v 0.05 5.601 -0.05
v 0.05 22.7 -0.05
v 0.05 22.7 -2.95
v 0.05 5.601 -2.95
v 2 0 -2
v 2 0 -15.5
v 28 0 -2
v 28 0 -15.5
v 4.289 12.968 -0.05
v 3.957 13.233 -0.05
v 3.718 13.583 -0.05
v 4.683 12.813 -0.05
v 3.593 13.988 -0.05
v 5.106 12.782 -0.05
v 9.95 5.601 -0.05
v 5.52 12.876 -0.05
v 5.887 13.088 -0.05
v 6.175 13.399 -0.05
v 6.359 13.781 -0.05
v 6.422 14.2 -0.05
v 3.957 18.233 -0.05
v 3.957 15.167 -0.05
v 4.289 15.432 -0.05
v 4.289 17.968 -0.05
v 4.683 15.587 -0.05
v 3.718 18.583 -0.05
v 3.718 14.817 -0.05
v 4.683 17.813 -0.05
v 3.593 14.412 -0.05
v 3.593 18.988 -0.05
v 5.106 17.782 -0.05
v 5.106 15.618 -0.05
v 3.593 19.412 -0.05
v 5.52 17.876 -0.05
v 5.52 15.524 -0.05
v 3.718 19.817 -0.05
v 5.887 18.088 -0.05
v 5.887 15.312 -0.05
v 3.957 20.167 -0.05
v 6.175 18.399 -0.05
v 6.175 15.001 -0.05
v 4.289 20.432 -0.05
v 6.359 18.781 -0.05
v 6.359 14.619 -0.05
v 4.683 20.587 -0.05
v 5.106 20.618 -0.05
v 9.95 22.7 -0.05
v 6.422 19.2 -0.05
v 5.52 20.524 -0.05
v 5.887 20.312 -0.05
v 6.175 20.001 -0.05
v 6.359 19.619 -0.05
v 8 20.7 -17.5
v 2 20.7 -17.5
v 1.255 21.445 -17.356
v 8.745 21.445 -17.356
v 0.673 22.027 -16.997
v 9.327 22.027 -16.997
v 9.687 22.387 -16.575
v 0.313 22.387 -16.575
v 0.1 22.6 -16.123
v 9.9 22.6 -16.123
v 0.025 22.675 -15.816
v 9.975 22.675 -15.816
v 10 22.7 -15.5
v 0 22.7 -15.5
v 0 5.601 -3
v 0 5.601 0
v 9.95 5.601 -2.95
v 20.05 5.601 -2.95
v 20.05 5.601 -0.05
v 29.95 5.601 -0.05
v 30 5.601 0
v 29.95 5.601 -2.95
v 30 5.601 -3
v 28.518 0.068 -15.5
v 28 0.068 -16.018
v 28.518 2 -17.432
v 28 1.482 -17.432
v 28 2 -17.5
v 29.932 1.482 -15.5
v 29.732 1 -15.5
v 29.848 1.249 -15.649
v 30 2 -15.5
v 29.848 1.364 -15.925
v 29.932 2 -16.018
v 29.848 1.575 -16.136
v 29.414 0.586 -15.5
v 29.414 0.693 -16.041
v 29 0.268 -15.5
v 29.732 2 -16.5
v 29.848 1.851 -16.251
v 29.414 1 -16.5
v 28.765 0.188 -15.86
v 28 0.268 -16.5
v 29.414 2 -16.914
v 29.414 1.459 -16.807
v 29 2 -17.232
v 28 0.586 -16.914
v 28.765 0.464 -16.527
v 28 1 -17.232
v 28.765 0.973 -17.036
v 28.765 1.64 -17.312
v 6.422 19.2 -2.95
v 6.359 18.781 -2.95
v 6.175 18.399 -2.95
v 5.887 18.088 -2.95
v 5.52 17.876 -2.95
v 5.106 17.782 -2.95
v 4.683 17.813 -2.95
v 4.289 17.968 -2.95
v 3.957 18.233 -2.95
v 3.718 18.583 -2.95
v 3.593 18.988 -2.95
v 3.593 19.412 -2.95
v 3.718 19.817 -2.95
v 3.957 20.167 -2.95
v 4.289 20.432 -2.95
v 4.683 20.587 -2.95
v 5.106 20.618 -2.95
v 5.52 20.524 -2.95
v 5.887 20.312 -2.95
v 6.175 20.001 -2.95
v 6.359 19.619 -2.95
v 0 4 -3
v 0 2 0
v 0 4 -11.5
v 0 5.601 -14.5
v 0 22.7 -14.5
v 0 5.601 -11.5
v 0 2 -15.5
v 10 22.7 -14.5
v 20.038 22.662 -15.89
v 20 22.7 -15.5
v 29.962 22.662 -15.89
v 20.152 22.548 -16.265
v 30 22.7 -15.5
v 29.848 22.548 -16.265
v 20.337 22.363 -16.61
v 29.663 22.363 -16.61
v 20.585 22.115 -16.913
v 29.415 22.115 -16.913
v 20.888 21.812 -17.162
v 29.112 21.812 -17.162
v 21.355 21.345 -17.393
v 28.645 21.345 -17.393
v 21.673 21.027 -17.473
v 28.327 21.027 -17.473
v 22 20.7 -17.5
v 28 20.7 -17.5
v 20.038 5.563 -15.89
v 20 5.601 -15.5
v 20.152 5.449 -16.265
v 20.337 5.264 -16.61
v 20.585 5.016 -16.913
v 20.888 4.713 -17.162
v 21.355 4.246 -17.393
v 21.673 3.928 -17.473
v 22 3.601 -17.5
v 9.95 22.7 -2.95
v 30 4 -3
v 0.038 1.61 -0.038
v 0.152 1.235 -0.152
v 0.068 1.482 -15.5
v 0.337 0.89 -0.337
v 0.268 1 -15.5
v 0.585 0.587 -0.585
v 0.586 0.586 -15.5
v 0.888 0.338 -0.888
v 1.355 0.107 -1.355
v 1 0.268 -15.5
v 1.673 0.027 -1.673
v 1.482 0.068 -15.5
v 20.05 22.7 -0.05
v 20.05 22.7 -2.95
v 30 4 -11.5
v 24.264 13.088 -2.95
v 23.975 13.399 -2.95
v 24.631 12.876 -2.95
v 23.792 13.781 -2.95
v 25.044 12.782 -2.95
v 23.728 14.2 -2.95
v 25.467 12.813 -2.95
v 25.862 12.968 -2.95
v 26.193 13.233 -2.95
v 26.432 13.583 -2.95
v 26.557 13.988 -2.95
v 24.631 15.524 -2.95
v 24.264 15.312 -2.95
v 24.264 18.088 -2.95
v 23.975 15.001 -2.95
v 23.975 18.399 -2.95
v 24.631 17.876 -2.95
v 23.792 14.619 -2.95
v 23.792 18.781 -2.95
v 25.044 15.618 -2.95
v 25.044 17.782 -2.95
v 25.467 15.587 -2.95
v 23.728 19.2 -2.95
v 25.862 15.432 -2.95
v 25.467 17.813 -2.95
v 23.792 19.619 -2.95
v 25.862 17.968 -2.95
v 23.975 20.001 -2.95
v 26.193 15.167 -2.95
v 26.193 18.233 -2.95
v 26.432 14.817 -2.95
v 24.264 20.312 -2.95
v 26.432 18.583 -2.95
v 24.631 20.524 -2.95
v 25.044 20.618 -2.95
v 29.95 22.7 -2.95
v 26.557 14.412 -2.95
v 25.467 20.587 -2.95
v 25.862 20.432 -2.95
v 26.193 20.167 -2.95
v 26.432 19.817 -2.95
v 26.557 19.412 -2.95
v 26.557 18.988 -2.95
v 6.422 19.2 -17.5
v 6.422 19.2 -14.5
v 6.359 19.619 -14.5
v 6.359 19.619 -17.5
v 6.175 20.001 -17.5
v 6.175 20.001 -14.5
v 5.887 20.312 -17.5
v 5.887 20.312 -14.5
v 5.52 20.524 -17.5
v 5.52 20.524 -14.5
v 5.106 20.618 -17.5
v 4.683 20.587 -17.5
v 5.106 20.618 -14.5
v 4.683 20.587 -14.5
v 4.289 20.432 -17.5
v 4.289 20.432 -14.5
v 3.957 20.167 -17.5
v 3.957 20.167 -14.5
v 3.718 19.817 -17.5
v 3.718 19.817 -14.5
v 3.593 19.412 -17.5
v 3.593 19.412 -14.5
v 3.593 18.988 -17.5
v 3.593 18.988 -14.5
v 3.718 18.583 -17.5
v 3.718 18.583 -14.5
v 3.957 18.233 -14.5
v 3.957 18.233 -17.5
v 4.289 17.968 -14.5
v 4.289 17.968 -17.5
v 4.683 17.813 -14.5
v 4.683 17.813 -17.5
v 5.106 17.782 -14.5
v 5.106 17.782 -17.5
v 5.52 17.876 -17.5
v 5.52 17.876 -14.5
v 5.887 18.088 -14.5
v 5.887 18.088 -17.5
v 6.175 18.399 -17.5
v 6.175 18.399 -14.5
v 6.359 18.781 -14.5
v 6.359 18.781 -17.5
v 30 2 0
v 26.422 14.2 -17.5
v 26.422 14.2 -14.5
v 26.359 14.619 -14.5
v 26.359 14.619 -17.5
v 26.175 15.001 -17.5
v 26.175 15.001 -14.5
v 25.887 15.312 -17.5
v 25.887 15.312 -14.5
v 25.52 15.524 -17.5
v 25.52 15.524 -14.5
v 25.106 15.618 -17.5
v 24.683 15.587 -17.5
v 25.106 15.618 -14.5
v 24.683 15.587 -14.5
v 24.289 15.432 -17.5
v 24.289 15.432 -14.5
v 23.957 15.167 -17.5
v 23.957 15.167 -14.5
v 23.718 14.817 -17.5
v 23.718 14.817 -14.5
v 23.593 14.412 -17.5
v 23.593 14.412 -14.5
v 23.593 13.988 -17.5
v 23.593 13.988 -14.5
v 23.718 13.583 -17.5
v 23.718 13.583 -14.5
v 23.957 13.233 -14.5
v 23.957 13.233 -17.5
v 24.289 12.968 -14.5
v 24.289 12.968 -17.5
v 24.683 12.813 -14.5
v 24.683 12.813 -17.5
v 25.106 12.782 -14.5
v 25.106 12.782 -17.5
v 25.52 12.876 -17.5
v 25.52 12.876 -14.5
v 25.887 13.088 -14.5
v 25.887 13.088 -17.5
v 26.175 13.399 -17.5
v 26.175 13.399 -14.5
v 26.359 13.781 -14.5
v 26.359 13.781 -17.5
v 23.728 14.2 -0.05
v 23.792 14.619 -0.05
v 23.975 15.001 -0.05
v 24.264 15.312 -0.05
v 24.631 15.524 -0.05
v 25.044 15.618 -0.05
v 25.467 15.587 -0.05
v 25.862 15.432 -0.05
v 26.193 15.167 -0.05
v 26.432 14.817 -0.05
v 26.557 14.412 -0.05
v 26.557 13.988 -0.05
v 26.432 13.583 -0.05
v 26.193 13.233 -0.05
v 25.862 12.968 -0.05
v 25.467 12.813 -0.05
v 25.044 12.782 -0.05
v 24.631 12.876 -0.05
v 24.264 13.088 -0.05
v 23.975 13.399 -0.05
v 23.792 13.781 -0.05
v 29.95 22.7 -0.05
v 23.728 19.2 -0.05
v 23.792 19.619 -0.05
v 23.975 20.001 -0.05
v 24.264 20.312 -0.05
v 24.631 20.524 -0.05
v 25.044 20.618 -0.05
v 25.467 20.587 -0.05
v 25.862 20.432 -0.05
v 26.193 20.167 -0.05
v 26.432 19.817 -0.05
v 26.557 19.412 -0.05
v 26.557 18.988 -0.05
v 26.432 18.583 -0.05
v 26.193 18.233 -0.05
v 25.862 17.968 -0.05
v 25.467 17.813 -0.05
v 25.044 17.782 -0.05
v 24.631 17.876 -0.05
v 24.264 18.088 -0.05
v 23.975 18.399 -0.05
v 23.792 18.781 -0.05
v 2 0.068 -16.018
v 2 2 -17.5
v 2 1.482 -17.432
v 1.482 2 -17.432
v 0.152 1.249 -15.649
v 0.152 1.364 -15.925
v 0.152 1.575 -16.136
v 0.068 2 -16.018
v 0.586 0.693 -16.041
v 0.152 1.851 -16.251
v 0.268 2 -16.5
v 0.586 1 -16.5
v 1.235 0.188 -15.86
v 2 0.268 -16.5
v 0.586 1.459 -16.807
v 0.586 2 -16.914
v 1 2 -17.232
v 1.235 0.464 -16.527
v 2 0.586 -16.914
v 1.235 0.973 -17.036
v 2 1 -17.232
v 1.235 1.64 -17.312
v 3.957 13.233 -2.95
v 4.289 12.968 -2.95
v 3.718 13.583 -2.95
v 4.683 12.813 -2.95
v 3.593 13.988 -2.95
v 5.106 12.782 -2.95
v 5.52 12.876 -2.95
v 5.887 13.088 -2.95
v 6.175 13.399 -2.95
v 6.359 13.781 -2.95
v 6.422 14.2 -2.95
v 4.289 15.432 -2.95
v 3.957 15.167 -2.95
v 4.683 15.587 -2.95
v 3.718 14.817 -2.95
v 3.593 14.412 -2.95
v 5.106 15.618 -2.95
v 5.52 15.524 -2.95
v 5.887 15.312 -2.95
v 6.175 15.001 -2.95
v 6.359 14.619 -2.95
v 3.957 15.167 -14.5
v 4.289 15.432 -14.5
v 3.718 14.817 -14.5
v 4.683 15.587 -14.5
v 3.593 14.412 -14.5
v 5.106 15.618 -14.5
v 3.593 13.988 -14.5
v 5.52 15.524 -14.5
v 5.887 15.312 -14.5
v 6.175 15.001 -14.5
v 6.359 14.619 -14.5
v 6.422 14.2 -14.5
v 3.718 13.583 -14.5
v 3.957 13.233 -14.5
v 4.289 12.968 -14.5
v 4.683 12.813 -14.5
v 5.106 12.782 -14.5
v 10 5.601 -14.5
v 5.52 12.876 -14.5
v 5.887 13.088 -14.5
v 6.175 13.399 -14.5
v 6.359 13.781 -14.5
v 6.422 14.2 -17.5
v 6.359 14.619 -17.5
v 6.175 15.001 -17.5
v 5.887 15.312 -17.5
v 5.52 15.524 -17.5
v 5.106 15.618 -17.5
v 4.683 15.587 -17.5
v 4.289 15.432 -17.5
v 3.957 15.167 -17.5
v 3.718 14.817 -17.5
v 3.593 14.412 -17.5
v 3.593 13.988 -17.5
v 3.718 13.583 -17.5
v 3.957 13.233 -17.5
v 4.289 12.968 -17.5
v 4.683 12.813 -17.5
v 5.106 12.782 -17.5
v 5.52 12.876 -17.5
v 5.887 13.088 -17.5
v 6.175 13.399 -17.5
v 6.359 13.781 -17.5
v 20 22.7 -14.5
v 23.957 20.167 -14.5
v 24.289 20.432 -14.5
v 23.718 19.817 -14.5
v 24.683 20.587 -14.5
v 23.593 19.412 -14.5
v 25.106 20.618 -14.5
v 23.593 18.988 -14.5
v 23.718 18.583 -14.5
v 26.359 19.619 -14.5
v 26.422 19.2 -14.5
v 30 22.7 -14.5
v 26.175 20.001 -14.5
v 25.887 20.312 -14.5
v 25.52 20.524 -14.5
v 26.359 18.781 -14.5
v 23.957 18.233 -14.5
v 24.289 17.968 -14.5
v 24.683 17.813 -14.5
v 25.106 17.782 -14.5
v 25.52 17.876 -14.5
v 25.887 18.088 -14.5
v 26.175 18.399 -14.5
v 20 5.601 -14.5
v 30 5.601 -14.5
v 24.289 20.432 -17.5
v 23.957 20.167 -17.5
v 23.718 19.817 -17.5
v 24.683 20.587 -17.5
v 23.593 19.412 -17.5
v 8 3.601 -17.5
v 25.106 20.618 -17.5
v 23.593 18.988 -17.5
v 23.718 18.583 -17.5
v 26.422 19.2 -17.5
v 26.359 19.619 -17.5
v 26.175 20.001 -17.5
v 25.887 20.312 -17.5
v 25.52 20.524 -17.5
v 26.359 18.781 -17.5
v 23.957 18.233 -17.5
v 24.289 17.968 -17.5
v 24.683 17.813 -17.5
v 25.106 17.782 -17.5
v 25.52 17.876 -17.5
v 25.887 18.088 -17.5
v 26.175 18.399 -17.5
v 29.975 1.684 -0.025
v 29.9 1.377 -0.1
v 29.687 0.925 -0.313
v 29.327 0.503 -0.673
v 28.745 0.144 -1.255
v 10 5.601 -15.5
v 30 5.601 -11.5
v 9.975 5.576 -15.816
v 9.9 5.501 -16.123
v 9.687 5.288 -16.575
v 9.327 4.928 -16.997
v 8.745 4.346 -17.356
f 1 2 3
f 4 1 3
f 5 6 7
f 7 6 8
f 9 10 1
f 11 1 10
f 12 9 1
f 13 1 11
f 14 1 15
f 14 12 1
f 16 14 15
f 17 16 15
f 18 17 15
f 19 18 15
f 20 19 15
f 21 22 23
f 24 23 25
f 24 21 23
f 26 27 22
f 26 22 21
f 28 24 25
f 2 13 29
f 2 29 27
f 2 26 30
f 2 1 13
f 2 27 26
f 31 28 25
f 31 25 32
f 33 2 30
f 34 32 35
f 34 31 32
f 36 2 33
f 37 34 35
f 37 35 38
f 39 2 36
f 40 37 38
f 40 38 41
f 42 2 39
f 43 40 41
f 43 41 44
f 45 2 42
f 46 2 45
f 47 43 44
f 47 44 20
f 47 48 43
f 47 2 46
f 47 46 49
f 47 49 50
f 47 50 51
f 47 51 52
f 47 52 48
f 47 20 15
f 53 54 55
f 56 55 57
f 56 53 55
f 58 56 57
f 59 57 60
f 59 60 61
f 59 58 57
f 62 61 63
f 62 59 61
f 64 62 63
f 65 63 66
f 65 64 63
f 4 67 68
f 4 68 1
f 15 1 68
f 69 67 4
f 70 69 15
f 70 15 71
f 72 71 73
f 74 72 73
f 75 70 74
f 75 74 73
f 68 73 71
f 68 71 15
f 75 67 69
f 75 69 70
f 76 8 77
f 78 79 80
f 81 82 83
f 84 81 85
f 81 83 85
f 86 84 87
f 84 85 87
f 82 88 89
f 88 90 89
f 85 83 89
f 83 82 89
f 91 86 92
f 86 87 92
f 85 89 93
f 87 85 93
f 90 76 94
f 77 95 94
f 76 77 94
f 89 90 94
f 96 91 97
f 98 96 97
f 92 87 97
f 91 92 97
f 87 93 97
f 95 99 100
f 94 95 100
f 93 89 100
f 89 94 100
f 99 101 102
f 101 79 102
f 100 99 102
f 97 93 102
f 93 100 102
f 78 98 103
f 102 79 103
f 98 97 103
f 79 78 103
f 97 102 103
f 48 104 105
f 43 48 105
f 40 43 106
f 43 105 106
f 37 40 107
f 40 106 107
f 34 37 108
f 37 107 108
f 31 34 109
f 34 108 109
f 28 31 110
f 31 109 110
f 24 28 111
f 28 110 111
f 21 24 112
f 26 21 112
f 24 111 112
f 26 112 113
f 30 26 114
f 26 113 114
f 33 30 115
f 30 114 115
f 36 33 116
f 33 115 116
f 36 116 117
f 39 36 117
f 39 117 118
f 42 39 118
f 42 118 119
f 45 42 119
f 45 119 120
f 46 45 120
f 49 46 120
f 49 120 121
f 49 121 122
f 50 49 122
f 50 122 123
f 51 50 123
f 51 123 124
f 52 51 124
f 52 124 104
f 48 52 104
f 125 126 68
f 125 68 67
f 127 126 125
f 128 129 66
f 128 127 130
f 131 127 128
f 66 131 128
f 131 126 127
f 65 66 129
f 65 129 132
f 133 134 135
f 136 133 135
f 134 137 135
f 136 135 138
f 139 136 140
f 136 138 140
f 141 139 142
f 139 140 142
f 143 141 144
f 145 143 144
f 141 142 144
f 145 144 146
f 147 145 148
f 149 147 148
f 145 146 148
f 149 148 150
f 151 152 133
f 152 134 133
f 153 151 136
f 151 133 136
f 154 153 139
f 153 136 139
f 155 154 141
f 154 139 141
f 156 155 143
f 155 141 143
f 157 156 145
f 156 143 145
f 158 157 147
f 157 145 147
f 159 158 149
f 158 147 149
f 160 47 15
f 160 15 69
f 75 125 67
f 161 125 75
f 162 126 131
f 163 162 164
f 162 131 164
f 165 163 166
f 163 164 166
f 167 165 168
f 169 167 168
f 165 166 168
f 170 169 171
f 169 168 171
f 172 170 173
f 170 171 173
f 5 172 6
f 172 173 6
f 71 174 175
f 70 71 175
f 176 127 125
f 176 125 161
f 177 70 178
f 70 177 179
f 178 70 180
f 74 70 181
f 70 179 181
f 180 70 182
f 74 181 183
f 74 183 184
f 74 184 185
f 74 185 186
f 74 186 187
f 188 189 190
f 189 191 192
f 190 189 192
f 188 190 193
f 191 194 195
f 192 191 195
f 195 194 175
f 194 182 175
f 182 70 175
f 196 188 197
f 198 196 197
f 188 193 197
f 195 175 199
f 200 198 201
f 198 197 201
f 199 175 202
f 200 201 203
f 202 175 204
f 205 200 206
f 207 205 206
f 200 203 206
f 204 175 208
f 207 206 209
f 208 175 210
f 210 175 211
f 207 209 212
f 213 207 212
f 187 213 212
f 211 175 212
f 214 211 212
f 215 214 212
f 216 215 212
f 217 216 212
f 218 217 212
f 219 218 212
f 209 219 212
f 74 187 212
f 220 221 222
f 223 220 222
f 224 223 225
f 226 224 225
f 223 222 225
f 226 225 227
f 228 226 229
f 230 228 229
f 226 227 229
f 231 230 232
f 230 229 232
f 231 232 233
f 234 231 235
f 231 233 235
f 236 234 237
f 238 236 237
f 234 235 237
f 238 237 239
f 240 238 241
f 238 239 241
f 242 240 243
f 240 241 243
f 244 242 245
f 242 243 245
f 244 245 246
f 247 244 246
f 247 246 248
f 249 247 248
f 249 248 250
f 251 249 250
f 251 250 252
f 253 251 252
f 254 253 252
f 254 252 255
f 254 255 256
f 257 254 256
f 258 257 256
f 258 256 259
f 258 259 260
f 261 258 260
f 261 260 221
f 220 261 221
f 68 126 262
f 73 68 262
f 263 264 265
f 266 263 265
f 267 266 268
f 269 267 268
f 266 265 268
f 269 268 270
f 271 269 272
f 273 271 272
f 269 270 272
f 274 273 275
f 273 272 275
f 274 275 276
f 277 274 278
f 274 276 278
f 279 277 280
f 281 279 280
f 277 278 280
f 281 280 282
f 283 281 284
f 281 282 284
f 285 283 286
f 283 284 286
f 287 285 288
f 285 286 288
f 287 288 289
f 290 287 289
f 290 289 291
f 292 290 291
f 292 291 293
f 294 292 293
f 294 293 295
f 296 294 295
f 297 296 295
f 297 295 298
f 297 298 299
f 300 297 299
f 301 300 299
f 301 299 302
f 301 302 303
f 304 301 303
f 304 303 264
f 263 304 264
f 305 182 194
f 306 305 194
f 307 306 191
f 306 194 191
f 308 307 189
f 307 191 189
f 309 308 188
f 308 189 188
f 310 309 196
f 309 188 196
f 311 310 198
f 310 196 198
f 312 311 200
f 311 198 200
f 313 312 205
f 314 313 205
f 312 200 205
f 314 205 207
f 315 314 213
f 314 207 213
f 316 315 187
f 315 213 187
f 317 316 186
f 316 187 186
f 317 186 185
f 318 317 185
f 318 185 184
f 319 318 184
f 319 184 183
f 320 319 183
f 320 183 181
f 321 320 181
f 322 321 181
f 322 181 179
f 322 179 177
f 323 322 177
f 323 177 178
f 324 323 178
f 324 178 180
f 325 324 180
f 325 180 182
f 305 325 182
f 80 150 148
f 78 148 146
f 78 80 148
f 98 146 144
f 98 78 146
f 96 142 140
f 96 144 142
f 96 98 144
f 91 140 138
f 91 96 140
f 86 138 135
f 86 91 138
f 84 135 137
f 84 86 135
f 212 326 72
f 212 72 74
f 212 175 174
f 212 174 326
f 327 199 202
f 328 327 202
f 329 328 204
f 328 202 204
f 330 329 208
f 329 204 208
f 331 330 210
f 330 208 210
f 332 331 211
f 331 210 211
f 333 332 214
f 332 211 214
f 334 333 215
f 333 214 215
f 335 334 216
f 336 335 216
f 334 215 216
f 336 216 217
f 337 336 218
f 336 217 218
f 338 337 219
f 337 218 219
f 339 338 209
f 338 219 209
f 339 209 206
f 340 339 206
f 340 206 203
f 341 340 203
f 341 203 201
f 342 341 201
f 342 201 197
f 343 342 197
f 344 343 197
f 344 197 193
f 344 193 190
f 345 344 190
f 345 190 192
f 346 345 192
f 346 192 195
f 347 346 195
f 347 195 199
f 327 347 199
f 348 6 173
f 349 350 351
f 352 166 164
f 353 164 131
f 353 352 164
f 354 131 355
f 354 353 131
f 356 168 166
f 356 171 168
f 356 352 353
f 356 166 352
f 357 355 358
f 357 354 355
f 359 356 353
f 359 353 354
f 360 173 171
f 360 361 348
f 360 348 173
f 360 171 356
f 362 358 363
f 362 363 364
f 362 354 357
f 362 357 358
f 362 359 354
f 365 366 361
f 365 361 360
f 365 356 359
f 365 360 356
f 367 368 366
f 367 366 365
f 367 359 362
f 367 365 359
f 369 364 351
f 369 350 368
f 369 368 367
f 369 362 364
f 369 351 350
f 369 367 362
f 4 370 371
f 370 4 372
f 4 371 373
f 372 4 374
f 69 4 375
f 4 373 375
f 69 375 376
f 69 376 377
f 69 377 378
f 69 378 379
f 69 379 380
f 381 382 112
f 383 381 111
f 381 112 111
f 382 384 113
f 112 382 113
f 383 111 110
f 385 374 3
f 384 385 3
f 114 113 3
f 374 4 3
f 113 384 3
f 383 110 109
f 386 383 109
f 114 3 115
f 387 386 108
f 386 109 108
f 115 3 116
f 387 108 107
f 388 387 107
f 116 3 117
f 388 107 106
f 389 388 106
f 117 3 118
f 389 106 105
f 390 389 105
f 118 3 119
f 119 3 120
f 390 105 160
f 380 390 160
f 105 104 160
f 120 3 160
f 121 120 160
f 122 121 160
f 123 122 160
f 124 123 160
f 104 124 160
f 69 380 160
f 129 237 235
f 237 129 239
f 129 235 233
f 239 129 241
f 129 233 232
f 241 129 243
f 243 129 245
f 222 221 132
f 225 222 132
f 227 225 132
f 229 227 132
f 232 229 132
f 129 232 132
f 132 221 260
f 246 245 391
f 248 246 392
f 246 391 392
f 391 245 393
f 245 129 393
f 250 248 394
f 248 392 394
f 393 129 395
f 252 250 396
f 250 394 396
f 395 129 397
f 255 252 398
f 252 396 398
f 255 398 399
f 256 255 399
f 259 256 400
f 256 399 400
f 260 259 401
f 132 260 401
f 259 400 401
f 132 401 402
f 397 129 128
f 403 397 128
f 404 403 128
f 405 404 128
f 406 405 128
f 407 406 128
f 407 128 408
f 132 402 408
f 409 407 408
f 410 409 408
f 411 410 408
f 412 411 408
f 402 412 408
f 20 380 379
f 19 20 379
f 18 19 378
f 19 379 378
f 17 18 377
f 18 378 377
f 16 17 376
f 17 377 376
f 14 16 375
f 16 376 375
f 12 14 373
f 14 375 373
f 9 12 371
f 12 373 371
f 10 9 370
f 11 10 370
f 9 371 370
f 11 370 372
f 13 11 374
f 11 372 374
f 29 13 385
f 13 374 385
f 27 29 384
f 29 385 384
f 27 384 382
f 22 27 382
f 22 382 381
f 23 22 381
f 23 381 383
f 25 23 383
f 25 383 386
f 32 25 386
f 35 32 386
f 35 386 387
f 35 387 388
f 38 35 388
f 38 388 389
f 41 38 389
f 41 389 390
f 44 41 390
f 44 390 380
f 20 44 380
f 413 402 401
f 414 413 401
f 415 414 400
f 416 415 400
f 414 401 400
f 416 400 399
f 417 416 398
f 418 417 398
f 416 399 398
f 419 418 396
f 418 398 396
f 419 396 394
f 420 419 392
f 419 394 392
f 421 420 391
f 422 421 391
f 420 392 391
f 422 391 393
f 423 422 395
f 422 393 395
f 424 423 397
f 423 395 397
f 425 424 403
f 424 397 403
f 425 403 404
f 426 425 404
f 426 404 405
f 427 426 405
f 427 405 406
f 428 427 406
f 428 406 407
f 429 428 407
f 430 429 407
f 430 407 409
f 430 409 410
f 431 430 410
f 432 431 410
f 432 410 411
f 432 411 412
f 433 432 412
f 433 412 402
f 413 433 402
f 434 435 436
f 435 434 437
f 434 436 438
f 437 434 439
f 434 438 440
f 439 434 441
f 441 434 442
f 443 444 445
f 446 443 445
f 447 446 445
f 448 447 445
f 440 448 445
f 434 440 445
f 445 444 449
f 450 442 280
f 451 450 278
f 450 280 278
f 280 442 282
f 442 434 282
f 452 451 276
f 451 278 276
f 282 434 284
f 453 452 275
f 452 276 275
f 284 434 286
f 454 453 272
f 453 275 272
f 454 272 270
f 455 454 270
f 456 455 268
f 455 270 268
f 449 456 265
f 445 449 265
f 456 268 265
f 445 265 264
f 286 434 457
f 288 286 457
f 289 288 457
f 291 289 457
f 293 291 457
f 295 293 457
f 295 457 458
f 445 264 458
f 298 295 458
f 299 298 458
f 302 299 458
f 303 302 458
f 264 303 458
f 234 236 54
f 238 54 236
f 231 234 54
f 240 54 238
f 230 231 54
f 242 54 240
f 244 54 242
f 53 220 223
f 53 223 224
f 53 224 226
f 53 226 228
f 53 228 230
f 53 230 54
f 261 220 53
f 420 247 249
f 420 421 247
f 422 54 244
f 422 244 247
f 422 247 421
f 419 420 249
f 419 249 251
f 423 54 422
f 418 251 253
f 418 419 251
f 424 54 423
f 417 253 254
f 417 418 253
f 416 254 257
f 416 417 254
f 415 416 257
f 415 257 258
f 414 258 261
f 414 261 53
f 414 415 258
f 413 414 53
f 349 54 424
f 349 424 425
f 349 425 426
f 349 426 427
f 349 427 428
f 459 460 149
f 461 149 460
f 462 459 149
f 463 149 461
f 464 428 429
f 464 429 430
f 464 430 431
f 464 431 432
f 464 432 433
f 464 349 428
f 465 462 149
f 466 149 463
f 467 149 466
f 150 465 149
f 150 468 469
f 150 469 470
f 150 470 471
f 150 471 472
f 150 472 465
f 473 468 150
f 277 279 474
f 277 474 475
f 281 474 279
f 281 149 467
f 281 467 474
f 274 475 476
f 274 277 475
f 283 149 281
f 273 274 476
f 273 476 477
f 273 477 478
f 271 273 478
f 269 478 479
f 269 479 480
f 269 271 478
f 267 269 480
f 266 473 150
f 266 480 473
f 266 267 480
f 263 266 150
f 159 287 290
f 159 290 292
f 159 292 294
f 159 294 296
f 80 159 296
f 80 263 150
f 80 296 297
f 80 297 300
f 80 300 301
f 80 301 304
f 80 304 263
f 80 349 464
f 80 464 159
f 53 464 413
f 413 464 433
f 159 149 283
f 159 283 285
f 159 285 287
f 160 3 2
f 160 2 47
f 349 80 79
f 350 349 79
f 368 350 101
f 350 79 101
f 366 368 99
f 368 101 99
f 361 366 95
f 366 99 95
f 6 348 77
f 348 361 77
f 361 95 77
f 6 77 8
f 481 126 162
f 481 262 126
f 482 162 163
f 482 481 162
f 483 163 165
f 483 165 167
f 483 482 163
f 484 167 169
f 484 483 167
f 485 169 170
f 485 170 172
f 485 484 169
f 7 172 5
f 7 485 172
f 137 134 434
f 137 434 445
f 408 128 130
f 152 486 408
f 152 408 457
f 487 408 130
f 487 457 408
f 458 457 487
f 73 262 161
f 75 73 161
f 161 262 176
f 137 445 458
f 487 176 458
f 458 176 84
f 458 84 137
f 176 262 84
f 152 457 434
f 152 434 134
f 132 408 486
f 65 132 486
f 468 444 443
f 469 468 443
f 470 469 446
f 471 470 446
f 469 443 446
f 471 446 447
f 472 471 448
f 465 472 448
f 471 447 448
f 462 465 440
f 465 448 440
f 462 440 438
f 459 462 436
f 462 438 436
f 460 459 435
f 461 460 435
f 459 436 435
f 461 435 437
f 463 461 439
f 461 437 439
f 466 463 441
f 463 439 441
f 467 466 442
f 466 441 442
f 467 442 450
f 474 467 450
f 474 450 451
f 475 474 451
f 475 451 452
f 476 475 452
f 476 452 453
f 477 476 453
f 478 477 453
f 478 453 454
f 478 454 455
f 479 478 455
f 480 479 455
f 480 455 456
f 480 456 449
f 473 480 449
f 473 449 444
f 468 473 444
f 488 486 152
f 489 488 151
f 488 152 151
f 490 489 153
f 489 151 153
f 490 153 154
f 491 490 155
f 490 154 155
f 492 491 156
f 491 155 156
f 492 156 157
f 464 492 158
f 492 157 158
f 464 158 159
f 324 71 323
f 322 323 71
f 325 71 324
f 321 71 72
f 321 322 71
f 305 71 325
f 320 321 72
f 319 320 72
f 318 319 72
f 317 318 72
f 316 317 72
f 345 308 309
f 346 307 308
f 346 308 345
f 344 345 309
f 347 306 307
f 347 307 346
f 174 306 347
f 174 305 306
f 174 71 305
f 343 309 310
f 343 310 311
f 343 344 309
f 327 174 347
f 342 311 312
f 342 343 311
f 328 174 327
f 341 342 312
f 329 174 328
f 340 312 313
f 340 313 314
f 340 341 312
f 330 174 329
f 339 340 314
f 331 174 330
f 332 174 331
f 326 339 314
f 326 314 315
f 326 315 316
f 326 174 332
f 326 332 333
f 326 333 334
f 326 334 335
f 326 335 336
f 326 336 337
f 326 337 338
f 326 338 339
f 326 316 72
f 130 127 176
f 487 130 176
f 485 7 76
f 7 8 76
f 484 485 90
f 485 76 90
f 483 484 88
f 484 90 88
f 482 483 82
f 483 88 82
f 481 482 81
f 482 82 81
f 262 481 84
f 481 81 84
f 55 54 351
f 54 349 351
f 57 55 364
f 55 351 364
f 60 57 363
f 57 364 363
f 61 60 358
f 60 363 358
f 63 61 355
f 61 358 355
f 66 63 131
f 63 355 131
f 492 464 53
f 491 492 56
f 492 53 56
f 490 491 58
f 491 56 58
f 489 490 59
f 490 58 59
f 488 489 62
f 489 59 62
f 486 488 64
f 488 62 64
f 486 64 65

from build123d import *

# Parameters (mm, degrees)
SKETCH1_W           = 30
SKETCH1_H           = 17.5
BOSS_EXTRUDE1_DEPTH = 4
SKETCH2_W           = 30
SKETCH2_H           = 6
BOSS_EXTRUDE2_DEPTH = 1.601
SKETCH3_W           = 10
SKETCH3_H           = 3
BOSS_EXTRUDE3_DEPTH = 18.7
SKETCH4_W           = 10
SKETCH4_H           = 3
BOSS_EXTRUDE4_DEPTH = 17.099
SKETCH5_W           = 10
SKETCH5_H           = 3
BOSS_EXTRUDE5_DEPTH = 1.601
FILLET1_R           = 2
CUT_EXTRUDE1_REACH  = 42.318
SKETCH6_R           = 1.4224
CUT_EXTRUDE2_REACH  = 42.318
SKETCH7_R           = 1.4224
SKETCH9_W           = 10
SKETCH9_H           = 3
SKETCH9_W_2         = 9.9
SKETCH9_H_2         = 2.9
CUT_EXTRUDE3_DEPTH  = 17.099


with BuildPart() as part:
    # Sketch1 → Boss-Extrude1 (new body)
    with BuildSketch(Plane(origin=(0, 0, 0), x_dir=(1, 0, 0), z_dir=(0, 1, 0))):
        with Locations((15, 8.75)):
            Rectangle(SKETCH1_W, SKETCH1_H)
    extrude(amount=BOSS_EXTRUDE1_DEPTH)

    # Sketch2 → Boss-Extrude2 (add)
    with BuildSketch(Plane(origin=(0, 4, 0), x_dir=(1, 0, 0), z_dir=(0, 1, 0))):
        with Locations((15, 14.5)):
            Rectangle(SKETCH2_W, SKETCH2_H)
    extrude(amount=BOSS_EXTRUDE2_DEPTH)

    # Sketch3 → Boss-Extrude3 (add)
    with BuildSketch(Plane(origin=(0, 4, 0), x_dir=(1, 0, 0), z_dir=(0, 1, 0))):
        with Locations((5, 1.5)):
            Rectangle(SKETCH3_W, SKETCH3_H)
        with Locations((25, 1.5)):
            Rectangle(SKETCH3_W, SKETCH3_H)
    extrude(amount=BOSS_EXTRUDE3_DEPTH)

    # Sketch4 → Boss-Extrude4 (add)
    with BuildSketch(Plane(origin=(0, 5.601, 0), x_dir=(1, 0, 0), z_dir=(0, 1, 0))):
        with Locations((5, 16)):
            Rectangle(SKETCH4_W, SKETCH4_H)
        with Locations((25, 16)):
            Rectangle(SKETCH4_W, SKETCH4_H)
    extrude(amount=BOSS_EXTRUDE4_DEPTH)

    # Sketch5 → Boss-Extrude5 (add)
    with BuildSketch(Plane(origin=(0, 4, 0), x_dir=(1, 0, 0), z_dir=(0, 1, 0))):
        with Locations((15, 1.5)):
            Rectangle(SKETCH5_W, SKETCH5_H)
    extrude(amount=BOSS_EXTRUDE5_DEPTH)

    # Fillet1
    fillet1_edges = [part.edges().sort_by_distance(p)[0] for p in [
        (15, 0, -17.5),
        (30, 0, -8.75),
        (15, 0, 0),
        (10, 14.1505, -17.5),
        (5, 22.7, -17.5),
        (0, 0, -8.75),
        (15, 5.601, -17.5),
        (20, 14.1505, -17.5),
        (25, 22.7, -17.5),
        (0, 11.35, -17.5),
        (30, 11.35, -17.5),
    ]]
    fillet(fillet1_edges, radius=FILLET1_R)

    # Sketch6 → Cut-Extrude1 (cut, up to next)
    with BuildSketch(Plane.XY.offset(-14.5), mode=Mode.PRIVATE) as cut_extrude1_sk1:
        with Locations((5, 19.2)):
            Circle(SKETCH6_R)
    cut_extrude1_tool1 = extrude(cut_extrude1_sk1.sketch, amount=-CUT_EXTRUDE1_REACH, mode=Mode.PRIVATE) & part.part
    # Sketch6 → Cut-Extrude1 (cut, up to next)
    with BuildSketch(Plane.XY.offset(-14.5), mode=Mode.PRIVATE) as cut_extrude1_sk2:
        with Locations((25, 19.2)):
            Circle(SKETCH6_R)
    cut_extrude1_tool2 = extrude(cut_extrude1_sk2.sketch, amount=-CUT_EXTRUDE1_REACH, mode=Mode.PRIVATE) & part.part
    # Sketch6 → Cut-Extrude1 (cut, up to next)
    with BuildSketch(Plane.XY.offset(-14.5), mode=Mode.PRIVATE) as cut_extrude1_sk3:
        with Locations((5, 14.2)):
            Circle(SKETCH6_R)
    cut_extrude1_tool3 = extrude(cut_extrude1_sk3.sketch, amount=-CUT_EXTRUDE1_REACH, mode=Mode.PRIVATE) & part.part
    # Sketch6 → Cut-Extrude1 (cut, up to next)
    with BuildSketch(Plane.XY.offset(-14.5), mode=Mode.PRIVATE) as cut_extrude1_sk4:
        with Locations((25, 14.2)):
            Circle(SKETCH6_R)
    cut_extrude1_tool4 = extrude(cut_extrude1_sk4.sketch, amount=-CUT_EXTRUDE1_REACH, mode=Mode.PRIVATE) & part.part
    add(cut_extrude1_tool1.solids().sort_by_distance((5, 19.2, -14.5))[0], mode=Mode.SUBTRACT)
    add(cut_extrude1_tool2.solids().sort_by_distance((25, 19.2, -14.5))[0], mode=Mode.SUBTRACT)
    add(cut_extrude1_tool3.solids().sort_by_distance((5, 14.2, -14.5))[0], mode=Mode.SUBTRACT)
    add(cut_extrude1_tool4.solids().sort_by_distance((25, 14.2, -14.5))[0], mode=Mode.SUBTRACT)

    # Sketch7 → Cut-Extrude2 (cut, up to next)
    with BuildSketch(Plane(origin=(0, 0, -3), x_dir=(-1, 0, 0), z_dir=(0, 0, -1)), mode=Mode.PRIVATE) as cut_extrude2_sk1:
        with Locations(Location((-5, 19.2, 0), (0, 0, 180))):
            Circle(SKETCH7_R)
    cut_extrude2_tool1 = extrude(cut_extrude2_sk1.sketch, amount=-CUT_EXTRUDE2_REACH, mode=Mode.PRIVATE) & part.part
    # Sketch7 → Cut-Extrude2 (cut, up to next)
    with BuildSketch(Plane(origin=(0, 0, -3), x_dir=(-1, 0, 0), z_dir=(0, 0, -1)), mode=Mode.PRIVATE) as cut_extrude2_sk2:
        with Locations((-25.150725931, 19.2)):
            Circle(SKETCH7_R)
    cut_extrude2_tool2 = extrude(cut_extrude2_sk2.sketch, amount=-CUT_EXTRUDE2_REACH, mode=Mode.PRIVATE) & part.part
    # Sketch7 → Cut-Extrude2 (cut, up to next)
    with BuildSketch(Plane(origin=(0, 0, -3), x_dir=(-1, 0, 0), z_dir=(0, 0, -1)), mode=Mode.PRIVATE) as cut_extrude2_sk3:
        with Locations((-25.150725931, 14.2)):
            Circle(SKETCH7_R)
    cut_extrude2_tool3 = extrude(cut_extrude2_sk3.sketch, amount=-CUT_EXTRUDE2_REACH, mode=Mode.PRIVATE) & part.part
    # Sketch7 → Cut-Extrude2 (cut, up to next)
    with BuildSketch(Plane(origin=(0, 0, -3), x_dir=(-1, 0, 0), z_dir=(0, 0, -1)), mode=Mode.PRIVATE) as cut_extrude2_sk4:
        with Locations(Location((-5, 14.2, 0), (0, 0, 180))):
            Circle(SKETCH7_R)
    cut_extrude2_tool4 = extrude(cut_extrude2_sk4.sketch, amount=-CUT_EXTRUDE2_REACH, mode=Mode.PRIVATE) & part.part
    add(cut_extrude2_tool1.solids().sort_by_distance((5, 19.2, -3))[0], mode=Mode.SUBTRACT)
    add(cut_extrude2_tool2.solids().sort_by_distance((25.150726, 19.2, -3))[0], mode=Mode.SUBTRACT)
    add(cut_extrude2_tool3.solids().sort_by_distance((25.150726, 14.2, -3))[0], mode=Mode.SUBTRACT)
    add(cut_extrude2_tool4.solids().sort_by_distance((5, 14.2, -3))[0], mode=Mode.SUBTRACT)

    # Sketch9 → Cut-Extrude3 (cut)
    # profile 1 of 2: a face of its own
    with BuildSketch(Plane(origin=(0, 22.7, 0), x_dir=(1, 0, 0), z_dir=(0, 1, 0))):
        with Locations((25, 1.5)):
            Rectangle(SKETCH9_W, SKETCH9_H)
        with Locations((25, 1.5)):
            Rectangle(SKETCH9_W_2, SKETCH9_H_2, mode=Mode.SUBTRACT)
    # profile 2 of 2: a face of its own
    with BuildSketch(Plane(origin=(0, 22.7, 0), x_dir=(1, 0, 0), z_dir=(0, 1, 0))):
        with Locations((5, 1.5)):
            Rectangle(SKETCH9_W, SKETCH9_H)
        with Locations((5, 1.5)):
            Rectangle(SKETCH9_W_2, SKETCH9_H_2, mode=Mode.SUBTRACT)
    extrude(amount=-CUT_EXTRUDE3_DEPTH, mode=Mode.SUBTRACT)


solid = part.part
